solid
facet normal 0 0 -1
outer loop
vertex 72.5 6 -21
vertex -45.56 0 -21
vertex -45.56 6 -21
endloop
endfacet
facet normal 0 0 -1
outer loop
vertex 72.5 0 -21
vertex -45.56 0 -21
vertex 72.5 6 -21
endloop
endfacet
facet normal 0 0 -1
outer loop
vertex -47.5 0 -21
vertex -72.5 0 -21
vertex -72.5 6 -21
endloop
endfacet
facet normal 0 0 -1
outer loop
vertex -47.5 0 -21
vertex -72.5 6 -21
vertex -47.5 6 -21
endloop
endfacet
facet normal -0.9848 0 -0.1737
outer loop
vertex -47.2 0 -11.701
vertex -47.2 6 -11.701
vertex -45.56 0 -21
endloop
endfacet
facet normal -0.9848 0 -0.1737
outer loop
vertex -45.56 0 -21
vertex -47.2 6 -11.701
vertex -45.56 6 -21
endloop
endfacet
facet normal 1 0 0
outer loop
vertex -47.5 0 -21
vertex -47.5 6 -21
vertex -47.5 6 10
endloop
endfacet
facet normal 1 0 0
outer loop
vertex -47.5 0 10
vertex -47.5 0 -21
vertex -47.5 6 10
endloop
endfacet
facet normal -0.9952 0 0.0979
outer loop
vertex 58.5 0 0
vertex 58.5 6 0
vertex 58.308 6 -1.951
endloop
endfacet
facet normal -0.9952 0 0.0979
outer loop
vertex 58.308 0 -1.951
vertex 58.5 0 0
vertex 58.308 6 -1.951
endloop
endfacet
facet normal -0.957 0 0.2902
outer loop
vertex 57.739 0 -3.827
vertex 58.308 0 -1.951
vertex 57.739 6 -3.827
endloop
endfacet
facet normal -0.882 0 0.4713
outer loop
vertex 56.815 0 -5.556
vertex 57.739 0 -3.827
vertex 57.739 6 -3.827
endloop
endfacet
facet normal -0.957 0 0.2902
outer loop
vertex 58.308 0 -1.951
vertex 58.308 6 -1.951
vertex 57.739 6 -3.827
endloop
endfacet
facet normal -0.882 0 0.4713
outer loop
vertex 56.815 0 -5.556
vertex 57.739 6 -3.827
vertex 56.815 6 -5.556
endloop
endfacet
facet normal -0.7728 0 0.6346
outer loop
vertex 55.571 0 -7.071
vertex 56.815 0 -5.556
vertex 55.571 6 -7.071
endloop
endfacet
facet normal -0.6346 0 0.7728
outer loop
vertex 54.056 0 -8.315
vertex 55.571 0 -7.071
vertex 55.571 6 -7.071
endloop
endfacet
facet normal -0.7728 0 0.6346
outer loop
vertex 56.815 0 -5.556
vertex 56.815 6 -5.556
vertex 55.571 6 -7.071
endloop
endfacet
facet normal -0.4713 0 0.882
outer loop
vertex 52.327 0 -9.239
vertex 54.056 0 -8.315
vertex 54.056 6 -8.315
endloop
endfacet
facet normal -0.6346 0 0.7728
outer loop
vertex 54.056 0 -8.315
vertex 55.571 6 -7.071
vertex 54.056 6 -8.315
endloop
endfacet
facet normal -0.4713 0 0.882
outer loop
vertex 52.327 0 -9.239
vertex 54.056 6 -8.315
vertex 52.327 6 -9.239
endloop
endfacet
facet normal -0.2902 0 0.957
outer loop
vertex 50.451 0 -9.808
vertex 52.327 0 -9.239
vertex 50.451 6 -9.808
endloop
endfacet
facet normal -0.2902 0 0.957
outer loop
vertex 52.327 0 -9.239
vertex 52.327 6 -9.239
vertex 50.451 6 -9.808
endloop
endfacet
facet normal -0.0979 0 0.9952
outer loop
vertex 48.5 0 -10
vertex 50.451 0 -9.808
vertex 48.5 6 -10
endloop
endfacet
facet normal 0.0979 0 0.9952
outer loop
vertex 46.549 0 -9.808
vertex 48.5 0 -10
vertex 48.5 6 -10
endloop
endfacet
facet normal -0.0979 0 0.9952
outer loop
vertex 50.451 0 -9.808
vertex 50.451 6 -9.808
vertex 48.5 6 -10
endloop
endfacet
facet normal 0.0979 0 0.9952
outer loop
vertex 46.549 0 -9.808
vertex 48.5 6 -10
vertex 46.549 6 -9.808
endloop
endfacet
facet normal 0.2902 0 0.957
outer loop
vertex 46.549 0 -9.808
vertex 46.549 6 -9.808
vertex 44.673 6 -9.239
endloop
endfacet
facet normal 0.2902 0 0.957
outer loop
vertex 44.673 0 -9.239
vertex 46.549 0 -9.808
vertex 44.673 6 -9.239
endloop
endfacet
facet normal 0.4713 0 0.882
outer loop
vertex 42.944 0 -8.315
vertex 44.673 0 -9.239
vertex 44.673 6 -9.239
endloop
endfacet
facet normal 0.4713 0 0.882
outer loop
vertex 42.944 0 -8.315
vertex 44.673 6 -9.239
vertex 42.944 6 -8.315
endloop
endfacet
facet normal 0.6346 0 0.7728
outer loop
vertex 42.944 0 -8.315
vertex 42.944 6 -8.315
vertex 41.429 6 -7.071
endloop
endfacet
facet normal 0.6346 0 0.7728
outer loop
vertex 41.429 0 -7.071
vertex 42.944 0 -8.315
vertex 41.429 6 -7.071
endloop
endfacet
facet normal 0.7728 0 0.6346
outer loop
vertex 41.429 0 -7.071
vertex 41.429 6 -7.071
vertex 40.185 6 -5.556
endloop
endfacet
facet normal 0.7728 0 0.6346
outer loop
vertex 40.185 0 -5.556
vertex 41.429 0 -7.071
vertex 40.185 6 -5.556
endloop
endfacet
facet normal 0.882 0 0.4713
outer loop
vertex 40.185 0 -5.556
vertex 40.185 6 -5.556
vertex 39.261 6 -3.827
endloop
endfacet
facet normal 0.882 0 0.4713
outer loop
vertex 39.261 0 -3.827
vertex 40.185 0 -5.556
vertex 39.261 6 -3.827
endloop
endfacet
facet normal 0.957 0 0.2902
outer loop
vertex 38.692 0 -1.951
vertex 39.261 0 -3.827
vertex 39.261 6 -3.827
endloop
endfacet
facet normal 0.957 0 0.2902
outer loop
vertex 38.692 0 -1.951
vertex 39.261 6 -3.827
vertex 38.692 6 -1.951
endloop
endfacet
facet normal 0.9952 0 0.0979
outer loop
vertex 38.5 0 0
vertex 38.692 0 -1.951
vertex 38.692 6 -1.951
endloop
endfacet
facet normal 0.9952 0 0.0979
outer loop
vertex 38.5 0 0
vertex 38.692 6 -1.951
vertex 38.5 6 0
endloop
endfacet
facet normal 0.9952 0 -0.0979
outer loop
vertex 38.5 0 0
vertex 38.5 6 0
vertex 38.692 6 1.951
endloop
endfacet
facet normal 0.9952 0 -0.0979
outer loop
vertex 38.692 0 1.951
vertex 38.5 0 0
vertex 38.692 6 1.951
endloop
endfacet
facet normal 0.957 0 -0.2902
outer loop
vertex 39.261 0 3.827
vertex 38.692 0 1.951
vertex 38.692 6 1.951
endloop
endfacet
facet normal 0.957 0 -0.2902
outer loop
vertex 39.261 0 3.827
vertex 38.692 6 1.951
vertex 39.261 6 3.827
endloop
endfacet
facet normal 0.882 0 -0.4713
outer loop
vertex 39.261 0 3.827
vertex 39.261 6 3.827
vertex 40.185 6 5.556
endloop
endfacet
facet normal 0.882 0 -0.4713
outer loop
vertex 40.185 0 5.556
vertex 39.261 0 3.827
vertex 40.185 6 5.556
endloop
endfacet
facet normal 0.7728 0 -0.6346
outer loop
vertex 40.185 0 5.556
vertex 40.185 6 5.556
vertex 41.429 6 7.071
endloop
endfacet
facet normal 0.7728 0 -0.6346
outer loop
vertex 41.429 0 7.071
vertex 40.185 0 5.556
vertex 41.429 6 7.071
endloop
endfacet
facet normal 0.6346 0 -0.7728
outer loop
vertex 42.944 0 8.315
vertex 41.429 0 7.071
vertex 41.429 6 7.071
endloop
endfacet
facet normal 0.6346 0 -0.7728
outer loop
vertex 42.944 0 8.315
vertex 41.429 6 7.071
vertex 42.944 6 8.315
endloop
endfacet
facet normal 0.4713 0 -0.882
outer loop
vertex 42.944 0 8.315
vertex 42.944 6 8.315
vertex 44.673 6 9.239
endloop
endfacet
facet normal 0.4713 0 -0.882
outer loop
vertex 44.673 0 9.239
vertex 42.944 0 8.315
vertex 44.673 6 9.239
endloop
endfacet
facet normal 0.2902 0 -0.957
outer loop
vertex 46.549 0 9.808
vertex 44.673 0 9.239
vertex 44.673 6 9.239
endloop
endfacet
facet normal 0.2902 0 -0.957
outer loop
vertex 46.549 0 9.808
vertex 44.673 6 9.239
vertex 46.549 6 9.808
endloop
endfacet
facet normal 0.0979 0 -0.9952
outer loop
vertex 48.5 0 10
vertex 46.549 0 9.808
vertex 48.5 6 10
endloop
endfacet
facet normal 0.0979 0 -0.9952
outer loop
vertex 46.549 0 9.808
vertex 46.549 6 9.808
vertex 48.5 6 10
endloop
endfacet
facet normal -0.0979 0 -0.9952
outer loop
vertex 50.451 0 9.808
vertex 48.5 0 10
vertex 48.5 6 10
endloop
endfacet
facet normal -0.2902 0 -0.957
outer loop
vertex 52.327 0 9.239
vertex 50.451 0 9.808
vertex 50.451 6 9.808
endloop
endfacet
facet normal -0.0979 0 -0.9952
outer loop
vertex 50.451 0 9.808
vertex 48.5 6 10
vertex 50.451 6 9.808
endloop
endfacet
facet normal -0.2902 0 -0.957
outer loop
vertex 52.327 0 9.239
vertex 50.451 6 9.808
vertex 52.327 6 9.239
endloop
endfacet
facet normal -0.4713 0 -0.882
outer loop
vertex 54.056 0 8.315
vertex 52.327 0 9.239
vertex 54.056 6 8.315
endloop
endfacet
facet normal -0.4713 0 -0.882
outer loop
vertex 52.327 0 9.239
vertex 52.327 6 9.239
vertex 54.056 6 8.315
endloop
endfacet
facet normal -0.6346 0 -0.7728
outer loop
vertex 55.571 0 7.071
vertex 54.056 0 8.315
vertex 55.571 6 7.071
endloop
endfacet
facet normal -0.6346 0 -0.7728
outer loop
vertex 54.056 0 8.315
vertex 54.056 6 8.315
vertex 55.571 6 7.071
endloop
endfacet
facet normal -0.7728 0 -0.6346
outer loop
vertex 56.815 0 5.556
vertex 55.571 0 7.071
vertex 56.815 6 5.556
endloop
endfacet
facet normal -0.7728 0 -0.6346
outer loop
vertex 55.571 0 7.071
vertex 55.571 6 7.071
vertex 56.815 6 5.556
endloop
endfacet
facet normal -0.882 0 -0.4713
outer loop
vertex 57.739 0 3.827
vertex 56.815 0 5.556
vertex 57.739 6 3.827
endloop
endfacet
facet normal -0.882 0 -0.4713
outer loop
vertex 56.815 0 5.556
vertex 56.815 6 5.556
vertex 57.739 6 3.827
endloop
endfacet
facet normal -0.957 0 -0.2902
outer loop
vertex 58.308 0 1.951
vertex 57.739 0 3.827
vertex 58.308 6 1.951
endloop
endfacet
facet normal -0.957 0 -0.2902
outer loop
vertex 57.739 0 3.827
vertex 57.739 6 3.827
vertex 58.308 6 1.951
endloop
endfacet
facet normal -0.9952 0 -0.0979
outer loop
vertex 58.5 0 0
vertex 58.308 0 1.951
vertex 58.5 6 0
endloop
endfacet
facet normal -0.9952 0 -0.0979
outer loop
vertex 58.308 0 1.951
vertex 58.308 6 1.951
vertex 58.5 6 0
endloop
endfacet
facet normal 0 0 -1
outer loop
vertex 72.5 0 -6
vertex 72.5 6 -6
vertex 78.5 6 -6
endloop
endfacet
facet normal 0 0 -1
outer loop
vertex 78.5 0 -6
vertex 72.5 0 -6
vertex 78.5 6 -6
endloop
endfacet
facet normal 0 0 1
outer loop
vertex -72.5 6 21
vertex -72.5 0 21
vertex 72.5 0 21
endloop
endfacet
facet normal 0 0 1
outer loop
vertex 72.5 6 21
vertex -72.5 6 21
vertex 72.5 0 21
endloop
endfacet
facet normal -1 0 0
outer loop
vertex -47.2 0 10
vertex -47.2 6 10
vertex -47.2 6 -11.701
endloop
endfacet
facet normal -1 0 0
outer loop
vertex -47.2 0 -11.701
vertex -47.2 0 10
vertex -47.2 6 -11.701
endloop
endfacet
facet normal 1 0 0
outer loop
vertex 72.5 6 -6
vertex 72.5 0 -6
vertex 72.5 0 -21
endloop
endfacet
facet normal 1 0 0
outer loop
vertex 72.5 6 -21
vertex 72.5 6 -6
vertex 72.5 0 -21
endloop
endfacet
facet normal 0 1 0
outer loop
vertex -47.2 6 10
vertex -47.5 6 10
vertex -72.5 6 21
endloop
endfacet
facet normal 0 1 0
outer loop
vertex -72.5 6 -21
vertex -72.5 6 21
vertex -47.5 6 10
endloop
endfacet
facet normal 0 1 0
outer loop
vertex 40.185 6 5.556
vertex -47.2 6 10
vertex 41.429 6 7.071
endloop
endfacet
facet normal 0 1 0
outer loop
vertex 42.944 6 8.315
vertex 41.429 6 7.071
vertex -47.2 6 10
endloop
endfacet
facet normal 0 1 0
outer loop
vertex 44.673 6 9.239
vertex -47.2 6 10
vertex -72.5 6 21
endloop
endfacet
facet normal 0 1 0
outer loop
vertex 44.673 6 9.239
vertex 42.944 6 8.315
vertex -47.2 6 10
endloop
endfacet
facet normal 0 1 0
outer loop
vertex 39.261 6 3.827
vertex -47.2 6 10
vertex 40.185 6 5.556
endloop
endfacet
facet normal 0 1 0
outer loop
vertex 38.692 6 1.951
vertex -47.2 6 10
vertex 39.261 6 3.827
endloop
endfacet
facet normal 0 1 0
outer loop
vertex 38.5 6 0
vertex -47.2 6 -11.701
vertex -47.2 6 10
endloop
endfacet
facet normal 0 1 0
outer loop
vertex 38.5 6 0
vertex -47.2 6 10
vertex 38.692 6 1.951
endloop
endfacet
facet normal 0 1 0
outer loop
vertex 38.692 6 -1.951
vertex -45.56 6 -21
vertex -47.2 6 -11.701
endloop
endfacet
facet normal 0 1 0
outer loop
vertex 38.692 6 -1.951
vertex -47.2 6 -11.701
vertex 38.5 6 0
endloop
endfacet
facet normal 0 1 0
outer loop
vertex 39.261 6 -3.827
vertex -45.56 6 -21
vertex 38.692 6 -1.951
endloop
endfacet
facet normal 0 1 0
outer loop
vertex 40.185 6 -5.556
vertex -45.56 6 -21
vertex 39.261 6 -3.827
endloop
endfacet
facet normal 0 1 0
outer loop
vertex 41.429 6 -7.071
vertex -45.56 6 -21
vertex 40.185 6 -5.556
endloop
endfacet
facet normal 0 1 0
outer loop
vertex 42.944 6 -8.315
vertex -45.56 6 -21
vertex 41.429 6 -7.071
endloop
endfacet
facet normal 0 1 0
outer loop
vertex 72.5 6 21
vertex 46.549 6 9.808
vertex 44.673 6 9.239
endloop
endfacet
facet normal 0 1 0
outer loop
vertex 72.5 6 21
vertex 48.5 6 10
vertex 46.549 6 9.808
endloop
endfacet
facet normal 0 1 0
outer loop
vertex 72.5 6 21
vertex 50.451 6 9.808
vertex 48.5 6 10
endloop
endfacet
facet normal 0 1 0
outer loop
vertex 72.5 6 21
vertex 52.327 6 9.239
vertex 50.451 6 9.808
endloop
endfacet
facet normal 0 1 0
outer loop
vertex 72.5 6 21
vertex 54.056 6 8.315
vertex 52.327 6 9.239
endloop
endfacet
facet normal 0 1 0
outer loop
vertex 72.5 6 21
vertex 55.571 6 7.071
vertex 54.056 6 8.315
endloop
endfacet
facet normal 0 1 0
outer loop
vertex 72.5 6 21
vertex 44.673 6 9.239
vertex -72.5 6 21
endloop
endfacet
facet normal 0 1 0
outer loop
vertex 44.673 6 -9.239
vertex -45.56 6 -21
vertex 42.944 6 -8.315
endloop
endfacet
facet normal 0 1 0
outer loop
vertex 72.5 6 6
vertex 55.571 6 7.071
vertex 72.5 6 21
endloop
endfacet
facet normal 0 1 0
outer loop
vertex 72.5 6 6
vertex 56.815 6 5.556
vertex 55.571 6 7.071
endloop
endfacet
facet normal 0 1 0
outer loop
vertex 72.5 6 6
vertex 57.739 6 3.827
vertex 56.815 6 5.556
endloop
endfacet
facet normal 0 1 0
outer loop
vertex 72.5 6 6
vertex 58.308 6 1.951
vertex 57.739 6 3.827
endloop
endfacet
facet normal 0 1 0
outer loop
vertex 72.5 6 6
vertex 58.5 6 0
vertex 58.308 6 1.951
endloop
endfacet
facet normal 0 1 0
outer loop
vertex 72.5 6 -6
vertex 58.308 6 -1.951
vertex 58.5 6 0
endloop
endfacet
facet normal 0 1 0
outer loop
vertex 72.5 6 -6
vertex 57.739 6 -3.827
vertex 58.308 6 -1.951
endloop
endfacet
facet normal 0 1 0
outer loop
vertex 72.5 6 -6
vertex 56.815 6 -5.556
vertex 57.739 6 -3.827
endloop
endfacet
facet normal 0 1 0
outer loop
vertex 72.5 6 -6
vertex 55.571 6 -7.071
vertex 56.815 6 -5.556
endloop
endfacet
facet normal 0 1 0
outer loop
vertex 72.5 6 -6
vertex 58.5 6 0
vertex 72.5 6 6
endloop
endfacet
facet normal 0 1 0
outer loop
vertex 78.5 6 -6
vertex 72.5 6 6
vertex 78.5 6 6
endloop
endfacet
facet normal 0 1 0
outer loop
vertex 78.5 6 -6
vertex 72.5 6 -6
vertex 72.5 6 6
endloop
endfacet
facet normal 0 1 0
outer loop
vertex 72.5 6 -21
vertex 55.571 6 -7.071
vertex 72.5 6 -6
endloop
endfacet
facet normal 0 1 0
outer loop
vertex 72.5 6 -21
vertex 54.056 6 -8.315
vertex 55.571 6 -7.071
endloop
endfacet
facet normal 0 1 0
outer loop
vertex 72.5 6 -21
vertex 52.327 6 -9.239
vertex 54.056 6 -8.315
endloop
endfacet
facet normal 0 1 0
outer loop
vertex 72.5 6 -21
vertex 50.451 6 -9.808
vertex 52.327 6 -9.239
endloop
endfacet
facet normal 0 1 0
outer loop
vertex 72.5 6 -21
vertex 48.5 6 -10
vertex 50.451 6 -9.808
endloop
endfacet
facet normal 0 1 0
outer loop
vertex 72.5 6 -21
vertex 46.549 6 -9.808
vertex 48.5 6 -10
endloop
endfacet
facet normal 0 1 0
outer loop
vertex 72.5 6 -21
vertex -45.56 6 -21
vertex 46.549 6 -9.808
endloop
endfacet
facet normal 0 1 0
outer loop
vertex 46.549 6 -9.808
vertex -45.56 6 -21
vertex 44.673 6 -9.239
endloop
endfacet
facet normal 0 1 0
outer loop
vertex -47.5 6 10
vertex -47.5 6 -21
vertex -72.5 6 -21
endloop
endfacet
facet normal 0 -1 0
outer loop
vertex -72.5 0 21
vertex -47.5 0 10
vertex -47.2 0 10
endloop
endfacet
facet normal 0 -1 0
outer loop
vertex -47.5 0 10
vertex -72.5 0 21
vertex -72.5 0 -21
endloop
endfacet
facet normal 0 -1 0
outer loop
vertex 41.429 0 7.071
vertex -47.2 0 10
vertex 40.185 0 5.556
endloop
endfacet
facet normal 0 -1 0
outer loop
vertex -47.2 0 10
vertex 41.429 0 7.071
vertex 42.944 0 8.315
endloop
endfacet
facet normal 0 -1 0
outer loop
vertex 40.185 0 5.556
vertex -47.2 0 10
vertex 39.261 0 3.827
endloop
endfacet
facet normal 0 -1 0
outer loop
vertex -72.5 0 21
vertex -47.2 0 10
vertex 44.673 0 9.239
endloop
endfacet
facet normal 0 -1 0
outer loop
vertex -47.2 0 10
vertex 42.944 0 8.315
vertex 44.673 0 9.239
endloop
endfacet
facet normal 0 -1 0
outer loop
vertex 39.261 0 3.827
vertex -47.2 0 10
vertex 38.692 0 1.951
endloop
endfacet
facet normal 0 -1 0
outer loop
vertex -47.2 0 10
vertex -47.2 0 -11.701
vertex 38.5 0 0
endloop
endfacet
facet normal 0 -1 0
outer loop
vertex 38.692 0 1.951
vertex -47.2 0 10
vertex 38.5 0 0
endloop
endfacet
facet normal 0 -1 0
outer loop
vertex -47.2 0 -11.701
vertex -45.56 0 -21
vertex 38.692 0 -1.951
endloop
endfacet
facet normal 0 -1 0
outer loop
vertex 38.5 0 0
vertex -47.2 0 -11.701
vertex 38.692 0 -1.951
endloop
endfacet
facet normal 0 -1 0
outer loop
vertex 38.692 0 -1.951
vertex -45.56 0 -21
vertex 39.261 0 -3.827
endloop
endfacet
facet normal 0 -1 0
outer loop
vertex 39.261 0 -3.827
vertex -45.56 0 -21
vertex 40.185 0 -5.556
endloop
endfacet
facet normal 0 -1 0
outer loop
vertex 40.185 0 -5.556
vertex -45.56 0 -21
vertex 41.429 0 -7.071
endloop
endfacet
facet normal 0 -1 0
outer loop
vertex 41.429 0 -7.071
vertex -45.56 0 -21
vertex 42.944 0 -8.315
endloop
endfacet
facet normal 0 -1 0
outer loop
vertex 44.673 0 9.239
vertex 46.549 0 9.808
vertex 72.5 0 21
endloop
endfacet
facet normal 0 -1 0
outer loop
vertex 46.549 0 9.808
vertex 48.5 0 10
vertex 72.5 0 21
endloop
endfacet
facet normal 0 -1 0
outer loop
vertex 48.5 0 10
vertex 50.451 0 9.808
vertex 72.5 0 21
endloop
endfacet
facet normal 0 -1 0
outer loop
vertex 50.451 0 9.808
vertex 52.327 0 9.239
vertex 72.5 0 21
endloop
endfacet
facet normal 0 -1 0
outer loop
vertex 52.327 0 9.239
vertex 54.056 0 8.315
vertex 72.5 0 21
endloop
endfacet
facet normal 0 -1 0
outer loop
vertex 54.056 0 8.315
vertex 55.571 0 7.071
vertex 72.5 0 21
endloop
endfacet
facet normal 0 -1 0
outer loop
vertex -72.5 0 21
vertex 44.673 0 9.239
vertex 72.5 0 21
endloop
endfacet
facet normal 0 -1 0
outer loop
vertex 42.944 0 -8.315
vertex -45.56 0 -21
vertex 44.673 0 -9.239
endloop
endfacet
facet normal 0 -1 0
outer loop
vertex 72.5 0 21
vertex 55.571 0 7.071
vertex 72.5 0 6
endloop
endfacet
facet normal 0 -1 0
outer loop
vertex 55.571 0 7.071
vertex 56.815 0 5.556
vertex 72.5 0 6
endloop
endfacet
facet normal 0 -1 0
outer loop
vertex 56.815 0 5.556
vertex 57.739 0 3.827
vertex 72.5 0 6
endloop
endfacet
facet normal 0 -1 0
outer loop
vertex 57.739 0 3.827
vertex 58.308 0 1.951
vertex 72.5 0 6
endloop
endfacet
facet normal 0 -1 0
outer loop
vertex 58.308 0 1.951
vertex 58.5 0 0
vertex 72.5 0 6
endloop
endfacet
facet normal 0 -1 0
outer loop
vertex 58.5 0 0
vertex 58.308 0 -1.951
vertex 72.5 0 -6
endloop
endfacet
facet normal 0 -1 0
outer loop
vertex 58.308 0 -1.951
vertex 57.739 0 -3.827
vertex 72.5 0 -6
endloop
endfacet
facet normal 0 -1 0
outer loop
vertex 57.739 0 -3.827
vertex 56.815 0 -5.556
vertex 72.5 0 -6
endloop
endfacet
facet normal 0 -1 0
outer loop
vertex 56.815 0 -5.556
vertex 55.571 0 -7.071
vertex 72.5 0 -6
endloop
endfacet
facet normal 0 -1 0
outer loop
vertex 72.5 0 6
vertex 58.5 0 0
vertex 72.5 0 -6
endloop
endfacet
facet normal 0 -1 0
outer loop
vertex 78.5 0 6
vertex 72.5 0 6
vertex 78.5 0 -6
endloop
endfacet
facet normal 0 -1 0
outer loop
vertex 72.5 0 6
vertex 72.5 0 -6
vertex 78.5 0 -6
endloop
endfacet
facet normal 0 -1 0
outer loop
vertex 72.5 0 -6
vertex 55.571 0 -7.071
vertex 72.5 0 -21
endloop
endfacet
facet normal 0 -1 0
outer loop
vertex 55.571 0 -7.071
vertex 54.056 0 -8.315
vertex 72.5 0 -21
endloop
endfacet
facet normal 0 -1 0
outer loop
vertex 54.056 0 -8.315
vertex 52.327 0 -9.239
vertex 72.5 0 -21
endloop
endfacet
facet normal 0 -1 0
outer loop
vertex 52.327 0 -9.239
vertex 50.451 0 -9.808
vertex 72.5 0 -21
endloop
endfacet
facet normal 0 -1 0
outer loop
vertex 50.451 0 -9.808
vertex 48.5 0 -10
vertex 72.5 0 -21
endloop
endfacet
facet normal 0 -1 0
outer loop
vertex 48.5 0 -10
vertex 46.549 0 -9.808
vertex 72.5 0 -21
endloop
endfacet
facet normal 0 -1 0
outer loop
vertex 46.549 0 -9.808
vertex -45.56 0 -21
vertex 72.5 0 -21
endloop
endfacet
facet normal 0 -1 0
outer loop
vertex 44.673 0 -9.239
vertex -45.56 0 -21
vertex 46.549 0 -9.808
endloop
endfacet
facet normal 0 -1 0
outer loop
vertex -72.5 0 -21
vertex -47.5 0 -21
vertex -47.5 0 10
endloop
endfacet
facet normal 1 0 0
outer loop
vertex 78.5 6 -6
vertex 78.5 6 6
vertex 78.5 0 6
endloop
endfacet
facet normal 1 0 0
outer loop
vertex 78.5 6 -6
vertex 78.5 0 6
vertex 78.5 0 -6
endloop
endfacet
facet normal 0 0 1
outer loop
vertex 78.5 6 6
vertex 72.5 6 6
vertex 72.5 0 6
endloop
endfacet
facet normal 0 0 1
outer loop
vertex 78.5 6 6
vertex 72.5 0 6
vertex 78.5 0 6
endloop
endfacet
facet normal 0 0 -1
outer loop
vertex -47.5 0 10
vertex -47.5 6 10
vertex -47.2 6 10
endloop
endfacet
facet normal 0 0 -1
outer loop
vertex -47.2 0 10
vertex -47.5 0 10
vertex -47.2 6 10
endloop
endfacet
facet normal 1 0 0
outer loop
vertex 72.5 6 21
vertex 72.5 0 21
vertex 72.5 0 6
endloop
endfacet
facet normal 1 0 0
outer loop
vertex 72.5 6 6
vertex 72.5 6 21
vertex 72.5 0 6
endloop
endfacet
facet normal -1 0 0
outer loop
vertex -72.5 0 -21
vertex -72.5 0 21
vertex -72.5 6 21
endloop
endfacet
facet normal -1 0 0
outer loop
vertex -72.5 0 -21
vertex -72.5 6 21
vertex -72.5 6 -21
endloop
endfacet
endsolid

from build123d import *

# Parameters (mm, degrees)
SKETCH1_W           = 145
SKETCH1_H           = 42
BOSS_EXTRUDE1_DEPTH = 6
SKETCH3_R           = 4
CUT_EXTRUDE1_DEPTH  = 7
SKETCH4_W           = 6
SKETCH4_H           = 12
BOSS_EXTRUDE2_DEPTH = 6
BOSS_EXTRUDE3_DEPTH = 6
SKETCH7_R           = 0.75
CUT_EXTRUDE2_DEPTH  = 7
CUT_EXTRUDE3_DEPTH  = 7
SKETCH9_R           = 10
CUT_EXTRUDE4_DEPTH  = 10


with BuildPart() as part:
    # Sketch1 → Boss-Extrude1 (new body)
    with BuildSketch(Plane(origin=(0, 0, 0), x_dir=(1, 0, 0), z_dir=(0, 1, 0))):
        Rectangle(SKETCH1_W, SKETCH1_H)
    extrude(amount=BOSS_EXTRUDE1_DEPTH)

    # Sketch3 → Cut-Extrude1 (cut, through all)
    with BuildSketch(Plane.XZ):
        with Locations((48.5, 0)):
            Circle(SKETCH3_R)
    extrude(amount=-CUT_EXTRUDE1_DEPTH, mode=Mode.SUBTRACT)

    # Sketch4 → Boss-Extrude2 (add)
    with BuildSketch(Plane(origin=(0, 6, 0), x_dir=(1, 0, 0), z_dir=(0, 1, 0))):
        with Locations((75.5, 0)):
            Rectangle(SKETCH4_W, SKETCH4_H)
    extrude(amount=-BOSS_EXTRUDE2_DEPTH)

    # Sketch5 → Boss-Extrude3 (add)
    with BuildSketch(Plane(origin=(0, 6, 0), x_dir=(1, 0, 0), z_dir=(0, 1, 0))):
        Polygon((-59.5, -10), (-72.5, -10), (-72.5, -21), (-53.5, -21), (-53.5, -17.5), (-59.5, -17.5), align=None)
    extrude(amount=-BOSS_EXTRUDE3_DEPTH)

    # Sketch7 → Cut-Extrude2 (cut, through all)
    with BuildSketch(Plane.XZ):
        with Locations((-161.479103552, -154.351327649)):
            Circle(SKETCH7_R)
    extrude(amount=-CUT_EXTRUDE2_DEPTH, mode=Mode.SUBTRACT)

    # Sketch8 → Cut-Extrude3 (cut, through all)
    with BuildSketch(Plane(origin=(0, 6, 0), x_dir=(1, 0, 0), z_dir=(0, 1, 0))):
        Polygon((-47.5, 21), (-47.5, -10), (-47.2, -10), (-47.2, 11.701384546), (-45.560403212, 21), align=None)
    extrude(amount=-CUT_EXTRUDE3_DEPTH, mode=Mode.SUBTRACT)

    # Sketch9 → Cut-Extrude4 (cut)
    with BuildSketch(Plane(origin=(0, 6, 0), x_dir=(1, 0, 0), z_dir=(0, 1, 0))):
        with Locations((48.5, 0)):
            Circle(SKETCH9_R)
    extrude(amount=-CUT_EXTRUDE4_DEPTH, mode=Mode.SUBTRACT)


solid = part.part
